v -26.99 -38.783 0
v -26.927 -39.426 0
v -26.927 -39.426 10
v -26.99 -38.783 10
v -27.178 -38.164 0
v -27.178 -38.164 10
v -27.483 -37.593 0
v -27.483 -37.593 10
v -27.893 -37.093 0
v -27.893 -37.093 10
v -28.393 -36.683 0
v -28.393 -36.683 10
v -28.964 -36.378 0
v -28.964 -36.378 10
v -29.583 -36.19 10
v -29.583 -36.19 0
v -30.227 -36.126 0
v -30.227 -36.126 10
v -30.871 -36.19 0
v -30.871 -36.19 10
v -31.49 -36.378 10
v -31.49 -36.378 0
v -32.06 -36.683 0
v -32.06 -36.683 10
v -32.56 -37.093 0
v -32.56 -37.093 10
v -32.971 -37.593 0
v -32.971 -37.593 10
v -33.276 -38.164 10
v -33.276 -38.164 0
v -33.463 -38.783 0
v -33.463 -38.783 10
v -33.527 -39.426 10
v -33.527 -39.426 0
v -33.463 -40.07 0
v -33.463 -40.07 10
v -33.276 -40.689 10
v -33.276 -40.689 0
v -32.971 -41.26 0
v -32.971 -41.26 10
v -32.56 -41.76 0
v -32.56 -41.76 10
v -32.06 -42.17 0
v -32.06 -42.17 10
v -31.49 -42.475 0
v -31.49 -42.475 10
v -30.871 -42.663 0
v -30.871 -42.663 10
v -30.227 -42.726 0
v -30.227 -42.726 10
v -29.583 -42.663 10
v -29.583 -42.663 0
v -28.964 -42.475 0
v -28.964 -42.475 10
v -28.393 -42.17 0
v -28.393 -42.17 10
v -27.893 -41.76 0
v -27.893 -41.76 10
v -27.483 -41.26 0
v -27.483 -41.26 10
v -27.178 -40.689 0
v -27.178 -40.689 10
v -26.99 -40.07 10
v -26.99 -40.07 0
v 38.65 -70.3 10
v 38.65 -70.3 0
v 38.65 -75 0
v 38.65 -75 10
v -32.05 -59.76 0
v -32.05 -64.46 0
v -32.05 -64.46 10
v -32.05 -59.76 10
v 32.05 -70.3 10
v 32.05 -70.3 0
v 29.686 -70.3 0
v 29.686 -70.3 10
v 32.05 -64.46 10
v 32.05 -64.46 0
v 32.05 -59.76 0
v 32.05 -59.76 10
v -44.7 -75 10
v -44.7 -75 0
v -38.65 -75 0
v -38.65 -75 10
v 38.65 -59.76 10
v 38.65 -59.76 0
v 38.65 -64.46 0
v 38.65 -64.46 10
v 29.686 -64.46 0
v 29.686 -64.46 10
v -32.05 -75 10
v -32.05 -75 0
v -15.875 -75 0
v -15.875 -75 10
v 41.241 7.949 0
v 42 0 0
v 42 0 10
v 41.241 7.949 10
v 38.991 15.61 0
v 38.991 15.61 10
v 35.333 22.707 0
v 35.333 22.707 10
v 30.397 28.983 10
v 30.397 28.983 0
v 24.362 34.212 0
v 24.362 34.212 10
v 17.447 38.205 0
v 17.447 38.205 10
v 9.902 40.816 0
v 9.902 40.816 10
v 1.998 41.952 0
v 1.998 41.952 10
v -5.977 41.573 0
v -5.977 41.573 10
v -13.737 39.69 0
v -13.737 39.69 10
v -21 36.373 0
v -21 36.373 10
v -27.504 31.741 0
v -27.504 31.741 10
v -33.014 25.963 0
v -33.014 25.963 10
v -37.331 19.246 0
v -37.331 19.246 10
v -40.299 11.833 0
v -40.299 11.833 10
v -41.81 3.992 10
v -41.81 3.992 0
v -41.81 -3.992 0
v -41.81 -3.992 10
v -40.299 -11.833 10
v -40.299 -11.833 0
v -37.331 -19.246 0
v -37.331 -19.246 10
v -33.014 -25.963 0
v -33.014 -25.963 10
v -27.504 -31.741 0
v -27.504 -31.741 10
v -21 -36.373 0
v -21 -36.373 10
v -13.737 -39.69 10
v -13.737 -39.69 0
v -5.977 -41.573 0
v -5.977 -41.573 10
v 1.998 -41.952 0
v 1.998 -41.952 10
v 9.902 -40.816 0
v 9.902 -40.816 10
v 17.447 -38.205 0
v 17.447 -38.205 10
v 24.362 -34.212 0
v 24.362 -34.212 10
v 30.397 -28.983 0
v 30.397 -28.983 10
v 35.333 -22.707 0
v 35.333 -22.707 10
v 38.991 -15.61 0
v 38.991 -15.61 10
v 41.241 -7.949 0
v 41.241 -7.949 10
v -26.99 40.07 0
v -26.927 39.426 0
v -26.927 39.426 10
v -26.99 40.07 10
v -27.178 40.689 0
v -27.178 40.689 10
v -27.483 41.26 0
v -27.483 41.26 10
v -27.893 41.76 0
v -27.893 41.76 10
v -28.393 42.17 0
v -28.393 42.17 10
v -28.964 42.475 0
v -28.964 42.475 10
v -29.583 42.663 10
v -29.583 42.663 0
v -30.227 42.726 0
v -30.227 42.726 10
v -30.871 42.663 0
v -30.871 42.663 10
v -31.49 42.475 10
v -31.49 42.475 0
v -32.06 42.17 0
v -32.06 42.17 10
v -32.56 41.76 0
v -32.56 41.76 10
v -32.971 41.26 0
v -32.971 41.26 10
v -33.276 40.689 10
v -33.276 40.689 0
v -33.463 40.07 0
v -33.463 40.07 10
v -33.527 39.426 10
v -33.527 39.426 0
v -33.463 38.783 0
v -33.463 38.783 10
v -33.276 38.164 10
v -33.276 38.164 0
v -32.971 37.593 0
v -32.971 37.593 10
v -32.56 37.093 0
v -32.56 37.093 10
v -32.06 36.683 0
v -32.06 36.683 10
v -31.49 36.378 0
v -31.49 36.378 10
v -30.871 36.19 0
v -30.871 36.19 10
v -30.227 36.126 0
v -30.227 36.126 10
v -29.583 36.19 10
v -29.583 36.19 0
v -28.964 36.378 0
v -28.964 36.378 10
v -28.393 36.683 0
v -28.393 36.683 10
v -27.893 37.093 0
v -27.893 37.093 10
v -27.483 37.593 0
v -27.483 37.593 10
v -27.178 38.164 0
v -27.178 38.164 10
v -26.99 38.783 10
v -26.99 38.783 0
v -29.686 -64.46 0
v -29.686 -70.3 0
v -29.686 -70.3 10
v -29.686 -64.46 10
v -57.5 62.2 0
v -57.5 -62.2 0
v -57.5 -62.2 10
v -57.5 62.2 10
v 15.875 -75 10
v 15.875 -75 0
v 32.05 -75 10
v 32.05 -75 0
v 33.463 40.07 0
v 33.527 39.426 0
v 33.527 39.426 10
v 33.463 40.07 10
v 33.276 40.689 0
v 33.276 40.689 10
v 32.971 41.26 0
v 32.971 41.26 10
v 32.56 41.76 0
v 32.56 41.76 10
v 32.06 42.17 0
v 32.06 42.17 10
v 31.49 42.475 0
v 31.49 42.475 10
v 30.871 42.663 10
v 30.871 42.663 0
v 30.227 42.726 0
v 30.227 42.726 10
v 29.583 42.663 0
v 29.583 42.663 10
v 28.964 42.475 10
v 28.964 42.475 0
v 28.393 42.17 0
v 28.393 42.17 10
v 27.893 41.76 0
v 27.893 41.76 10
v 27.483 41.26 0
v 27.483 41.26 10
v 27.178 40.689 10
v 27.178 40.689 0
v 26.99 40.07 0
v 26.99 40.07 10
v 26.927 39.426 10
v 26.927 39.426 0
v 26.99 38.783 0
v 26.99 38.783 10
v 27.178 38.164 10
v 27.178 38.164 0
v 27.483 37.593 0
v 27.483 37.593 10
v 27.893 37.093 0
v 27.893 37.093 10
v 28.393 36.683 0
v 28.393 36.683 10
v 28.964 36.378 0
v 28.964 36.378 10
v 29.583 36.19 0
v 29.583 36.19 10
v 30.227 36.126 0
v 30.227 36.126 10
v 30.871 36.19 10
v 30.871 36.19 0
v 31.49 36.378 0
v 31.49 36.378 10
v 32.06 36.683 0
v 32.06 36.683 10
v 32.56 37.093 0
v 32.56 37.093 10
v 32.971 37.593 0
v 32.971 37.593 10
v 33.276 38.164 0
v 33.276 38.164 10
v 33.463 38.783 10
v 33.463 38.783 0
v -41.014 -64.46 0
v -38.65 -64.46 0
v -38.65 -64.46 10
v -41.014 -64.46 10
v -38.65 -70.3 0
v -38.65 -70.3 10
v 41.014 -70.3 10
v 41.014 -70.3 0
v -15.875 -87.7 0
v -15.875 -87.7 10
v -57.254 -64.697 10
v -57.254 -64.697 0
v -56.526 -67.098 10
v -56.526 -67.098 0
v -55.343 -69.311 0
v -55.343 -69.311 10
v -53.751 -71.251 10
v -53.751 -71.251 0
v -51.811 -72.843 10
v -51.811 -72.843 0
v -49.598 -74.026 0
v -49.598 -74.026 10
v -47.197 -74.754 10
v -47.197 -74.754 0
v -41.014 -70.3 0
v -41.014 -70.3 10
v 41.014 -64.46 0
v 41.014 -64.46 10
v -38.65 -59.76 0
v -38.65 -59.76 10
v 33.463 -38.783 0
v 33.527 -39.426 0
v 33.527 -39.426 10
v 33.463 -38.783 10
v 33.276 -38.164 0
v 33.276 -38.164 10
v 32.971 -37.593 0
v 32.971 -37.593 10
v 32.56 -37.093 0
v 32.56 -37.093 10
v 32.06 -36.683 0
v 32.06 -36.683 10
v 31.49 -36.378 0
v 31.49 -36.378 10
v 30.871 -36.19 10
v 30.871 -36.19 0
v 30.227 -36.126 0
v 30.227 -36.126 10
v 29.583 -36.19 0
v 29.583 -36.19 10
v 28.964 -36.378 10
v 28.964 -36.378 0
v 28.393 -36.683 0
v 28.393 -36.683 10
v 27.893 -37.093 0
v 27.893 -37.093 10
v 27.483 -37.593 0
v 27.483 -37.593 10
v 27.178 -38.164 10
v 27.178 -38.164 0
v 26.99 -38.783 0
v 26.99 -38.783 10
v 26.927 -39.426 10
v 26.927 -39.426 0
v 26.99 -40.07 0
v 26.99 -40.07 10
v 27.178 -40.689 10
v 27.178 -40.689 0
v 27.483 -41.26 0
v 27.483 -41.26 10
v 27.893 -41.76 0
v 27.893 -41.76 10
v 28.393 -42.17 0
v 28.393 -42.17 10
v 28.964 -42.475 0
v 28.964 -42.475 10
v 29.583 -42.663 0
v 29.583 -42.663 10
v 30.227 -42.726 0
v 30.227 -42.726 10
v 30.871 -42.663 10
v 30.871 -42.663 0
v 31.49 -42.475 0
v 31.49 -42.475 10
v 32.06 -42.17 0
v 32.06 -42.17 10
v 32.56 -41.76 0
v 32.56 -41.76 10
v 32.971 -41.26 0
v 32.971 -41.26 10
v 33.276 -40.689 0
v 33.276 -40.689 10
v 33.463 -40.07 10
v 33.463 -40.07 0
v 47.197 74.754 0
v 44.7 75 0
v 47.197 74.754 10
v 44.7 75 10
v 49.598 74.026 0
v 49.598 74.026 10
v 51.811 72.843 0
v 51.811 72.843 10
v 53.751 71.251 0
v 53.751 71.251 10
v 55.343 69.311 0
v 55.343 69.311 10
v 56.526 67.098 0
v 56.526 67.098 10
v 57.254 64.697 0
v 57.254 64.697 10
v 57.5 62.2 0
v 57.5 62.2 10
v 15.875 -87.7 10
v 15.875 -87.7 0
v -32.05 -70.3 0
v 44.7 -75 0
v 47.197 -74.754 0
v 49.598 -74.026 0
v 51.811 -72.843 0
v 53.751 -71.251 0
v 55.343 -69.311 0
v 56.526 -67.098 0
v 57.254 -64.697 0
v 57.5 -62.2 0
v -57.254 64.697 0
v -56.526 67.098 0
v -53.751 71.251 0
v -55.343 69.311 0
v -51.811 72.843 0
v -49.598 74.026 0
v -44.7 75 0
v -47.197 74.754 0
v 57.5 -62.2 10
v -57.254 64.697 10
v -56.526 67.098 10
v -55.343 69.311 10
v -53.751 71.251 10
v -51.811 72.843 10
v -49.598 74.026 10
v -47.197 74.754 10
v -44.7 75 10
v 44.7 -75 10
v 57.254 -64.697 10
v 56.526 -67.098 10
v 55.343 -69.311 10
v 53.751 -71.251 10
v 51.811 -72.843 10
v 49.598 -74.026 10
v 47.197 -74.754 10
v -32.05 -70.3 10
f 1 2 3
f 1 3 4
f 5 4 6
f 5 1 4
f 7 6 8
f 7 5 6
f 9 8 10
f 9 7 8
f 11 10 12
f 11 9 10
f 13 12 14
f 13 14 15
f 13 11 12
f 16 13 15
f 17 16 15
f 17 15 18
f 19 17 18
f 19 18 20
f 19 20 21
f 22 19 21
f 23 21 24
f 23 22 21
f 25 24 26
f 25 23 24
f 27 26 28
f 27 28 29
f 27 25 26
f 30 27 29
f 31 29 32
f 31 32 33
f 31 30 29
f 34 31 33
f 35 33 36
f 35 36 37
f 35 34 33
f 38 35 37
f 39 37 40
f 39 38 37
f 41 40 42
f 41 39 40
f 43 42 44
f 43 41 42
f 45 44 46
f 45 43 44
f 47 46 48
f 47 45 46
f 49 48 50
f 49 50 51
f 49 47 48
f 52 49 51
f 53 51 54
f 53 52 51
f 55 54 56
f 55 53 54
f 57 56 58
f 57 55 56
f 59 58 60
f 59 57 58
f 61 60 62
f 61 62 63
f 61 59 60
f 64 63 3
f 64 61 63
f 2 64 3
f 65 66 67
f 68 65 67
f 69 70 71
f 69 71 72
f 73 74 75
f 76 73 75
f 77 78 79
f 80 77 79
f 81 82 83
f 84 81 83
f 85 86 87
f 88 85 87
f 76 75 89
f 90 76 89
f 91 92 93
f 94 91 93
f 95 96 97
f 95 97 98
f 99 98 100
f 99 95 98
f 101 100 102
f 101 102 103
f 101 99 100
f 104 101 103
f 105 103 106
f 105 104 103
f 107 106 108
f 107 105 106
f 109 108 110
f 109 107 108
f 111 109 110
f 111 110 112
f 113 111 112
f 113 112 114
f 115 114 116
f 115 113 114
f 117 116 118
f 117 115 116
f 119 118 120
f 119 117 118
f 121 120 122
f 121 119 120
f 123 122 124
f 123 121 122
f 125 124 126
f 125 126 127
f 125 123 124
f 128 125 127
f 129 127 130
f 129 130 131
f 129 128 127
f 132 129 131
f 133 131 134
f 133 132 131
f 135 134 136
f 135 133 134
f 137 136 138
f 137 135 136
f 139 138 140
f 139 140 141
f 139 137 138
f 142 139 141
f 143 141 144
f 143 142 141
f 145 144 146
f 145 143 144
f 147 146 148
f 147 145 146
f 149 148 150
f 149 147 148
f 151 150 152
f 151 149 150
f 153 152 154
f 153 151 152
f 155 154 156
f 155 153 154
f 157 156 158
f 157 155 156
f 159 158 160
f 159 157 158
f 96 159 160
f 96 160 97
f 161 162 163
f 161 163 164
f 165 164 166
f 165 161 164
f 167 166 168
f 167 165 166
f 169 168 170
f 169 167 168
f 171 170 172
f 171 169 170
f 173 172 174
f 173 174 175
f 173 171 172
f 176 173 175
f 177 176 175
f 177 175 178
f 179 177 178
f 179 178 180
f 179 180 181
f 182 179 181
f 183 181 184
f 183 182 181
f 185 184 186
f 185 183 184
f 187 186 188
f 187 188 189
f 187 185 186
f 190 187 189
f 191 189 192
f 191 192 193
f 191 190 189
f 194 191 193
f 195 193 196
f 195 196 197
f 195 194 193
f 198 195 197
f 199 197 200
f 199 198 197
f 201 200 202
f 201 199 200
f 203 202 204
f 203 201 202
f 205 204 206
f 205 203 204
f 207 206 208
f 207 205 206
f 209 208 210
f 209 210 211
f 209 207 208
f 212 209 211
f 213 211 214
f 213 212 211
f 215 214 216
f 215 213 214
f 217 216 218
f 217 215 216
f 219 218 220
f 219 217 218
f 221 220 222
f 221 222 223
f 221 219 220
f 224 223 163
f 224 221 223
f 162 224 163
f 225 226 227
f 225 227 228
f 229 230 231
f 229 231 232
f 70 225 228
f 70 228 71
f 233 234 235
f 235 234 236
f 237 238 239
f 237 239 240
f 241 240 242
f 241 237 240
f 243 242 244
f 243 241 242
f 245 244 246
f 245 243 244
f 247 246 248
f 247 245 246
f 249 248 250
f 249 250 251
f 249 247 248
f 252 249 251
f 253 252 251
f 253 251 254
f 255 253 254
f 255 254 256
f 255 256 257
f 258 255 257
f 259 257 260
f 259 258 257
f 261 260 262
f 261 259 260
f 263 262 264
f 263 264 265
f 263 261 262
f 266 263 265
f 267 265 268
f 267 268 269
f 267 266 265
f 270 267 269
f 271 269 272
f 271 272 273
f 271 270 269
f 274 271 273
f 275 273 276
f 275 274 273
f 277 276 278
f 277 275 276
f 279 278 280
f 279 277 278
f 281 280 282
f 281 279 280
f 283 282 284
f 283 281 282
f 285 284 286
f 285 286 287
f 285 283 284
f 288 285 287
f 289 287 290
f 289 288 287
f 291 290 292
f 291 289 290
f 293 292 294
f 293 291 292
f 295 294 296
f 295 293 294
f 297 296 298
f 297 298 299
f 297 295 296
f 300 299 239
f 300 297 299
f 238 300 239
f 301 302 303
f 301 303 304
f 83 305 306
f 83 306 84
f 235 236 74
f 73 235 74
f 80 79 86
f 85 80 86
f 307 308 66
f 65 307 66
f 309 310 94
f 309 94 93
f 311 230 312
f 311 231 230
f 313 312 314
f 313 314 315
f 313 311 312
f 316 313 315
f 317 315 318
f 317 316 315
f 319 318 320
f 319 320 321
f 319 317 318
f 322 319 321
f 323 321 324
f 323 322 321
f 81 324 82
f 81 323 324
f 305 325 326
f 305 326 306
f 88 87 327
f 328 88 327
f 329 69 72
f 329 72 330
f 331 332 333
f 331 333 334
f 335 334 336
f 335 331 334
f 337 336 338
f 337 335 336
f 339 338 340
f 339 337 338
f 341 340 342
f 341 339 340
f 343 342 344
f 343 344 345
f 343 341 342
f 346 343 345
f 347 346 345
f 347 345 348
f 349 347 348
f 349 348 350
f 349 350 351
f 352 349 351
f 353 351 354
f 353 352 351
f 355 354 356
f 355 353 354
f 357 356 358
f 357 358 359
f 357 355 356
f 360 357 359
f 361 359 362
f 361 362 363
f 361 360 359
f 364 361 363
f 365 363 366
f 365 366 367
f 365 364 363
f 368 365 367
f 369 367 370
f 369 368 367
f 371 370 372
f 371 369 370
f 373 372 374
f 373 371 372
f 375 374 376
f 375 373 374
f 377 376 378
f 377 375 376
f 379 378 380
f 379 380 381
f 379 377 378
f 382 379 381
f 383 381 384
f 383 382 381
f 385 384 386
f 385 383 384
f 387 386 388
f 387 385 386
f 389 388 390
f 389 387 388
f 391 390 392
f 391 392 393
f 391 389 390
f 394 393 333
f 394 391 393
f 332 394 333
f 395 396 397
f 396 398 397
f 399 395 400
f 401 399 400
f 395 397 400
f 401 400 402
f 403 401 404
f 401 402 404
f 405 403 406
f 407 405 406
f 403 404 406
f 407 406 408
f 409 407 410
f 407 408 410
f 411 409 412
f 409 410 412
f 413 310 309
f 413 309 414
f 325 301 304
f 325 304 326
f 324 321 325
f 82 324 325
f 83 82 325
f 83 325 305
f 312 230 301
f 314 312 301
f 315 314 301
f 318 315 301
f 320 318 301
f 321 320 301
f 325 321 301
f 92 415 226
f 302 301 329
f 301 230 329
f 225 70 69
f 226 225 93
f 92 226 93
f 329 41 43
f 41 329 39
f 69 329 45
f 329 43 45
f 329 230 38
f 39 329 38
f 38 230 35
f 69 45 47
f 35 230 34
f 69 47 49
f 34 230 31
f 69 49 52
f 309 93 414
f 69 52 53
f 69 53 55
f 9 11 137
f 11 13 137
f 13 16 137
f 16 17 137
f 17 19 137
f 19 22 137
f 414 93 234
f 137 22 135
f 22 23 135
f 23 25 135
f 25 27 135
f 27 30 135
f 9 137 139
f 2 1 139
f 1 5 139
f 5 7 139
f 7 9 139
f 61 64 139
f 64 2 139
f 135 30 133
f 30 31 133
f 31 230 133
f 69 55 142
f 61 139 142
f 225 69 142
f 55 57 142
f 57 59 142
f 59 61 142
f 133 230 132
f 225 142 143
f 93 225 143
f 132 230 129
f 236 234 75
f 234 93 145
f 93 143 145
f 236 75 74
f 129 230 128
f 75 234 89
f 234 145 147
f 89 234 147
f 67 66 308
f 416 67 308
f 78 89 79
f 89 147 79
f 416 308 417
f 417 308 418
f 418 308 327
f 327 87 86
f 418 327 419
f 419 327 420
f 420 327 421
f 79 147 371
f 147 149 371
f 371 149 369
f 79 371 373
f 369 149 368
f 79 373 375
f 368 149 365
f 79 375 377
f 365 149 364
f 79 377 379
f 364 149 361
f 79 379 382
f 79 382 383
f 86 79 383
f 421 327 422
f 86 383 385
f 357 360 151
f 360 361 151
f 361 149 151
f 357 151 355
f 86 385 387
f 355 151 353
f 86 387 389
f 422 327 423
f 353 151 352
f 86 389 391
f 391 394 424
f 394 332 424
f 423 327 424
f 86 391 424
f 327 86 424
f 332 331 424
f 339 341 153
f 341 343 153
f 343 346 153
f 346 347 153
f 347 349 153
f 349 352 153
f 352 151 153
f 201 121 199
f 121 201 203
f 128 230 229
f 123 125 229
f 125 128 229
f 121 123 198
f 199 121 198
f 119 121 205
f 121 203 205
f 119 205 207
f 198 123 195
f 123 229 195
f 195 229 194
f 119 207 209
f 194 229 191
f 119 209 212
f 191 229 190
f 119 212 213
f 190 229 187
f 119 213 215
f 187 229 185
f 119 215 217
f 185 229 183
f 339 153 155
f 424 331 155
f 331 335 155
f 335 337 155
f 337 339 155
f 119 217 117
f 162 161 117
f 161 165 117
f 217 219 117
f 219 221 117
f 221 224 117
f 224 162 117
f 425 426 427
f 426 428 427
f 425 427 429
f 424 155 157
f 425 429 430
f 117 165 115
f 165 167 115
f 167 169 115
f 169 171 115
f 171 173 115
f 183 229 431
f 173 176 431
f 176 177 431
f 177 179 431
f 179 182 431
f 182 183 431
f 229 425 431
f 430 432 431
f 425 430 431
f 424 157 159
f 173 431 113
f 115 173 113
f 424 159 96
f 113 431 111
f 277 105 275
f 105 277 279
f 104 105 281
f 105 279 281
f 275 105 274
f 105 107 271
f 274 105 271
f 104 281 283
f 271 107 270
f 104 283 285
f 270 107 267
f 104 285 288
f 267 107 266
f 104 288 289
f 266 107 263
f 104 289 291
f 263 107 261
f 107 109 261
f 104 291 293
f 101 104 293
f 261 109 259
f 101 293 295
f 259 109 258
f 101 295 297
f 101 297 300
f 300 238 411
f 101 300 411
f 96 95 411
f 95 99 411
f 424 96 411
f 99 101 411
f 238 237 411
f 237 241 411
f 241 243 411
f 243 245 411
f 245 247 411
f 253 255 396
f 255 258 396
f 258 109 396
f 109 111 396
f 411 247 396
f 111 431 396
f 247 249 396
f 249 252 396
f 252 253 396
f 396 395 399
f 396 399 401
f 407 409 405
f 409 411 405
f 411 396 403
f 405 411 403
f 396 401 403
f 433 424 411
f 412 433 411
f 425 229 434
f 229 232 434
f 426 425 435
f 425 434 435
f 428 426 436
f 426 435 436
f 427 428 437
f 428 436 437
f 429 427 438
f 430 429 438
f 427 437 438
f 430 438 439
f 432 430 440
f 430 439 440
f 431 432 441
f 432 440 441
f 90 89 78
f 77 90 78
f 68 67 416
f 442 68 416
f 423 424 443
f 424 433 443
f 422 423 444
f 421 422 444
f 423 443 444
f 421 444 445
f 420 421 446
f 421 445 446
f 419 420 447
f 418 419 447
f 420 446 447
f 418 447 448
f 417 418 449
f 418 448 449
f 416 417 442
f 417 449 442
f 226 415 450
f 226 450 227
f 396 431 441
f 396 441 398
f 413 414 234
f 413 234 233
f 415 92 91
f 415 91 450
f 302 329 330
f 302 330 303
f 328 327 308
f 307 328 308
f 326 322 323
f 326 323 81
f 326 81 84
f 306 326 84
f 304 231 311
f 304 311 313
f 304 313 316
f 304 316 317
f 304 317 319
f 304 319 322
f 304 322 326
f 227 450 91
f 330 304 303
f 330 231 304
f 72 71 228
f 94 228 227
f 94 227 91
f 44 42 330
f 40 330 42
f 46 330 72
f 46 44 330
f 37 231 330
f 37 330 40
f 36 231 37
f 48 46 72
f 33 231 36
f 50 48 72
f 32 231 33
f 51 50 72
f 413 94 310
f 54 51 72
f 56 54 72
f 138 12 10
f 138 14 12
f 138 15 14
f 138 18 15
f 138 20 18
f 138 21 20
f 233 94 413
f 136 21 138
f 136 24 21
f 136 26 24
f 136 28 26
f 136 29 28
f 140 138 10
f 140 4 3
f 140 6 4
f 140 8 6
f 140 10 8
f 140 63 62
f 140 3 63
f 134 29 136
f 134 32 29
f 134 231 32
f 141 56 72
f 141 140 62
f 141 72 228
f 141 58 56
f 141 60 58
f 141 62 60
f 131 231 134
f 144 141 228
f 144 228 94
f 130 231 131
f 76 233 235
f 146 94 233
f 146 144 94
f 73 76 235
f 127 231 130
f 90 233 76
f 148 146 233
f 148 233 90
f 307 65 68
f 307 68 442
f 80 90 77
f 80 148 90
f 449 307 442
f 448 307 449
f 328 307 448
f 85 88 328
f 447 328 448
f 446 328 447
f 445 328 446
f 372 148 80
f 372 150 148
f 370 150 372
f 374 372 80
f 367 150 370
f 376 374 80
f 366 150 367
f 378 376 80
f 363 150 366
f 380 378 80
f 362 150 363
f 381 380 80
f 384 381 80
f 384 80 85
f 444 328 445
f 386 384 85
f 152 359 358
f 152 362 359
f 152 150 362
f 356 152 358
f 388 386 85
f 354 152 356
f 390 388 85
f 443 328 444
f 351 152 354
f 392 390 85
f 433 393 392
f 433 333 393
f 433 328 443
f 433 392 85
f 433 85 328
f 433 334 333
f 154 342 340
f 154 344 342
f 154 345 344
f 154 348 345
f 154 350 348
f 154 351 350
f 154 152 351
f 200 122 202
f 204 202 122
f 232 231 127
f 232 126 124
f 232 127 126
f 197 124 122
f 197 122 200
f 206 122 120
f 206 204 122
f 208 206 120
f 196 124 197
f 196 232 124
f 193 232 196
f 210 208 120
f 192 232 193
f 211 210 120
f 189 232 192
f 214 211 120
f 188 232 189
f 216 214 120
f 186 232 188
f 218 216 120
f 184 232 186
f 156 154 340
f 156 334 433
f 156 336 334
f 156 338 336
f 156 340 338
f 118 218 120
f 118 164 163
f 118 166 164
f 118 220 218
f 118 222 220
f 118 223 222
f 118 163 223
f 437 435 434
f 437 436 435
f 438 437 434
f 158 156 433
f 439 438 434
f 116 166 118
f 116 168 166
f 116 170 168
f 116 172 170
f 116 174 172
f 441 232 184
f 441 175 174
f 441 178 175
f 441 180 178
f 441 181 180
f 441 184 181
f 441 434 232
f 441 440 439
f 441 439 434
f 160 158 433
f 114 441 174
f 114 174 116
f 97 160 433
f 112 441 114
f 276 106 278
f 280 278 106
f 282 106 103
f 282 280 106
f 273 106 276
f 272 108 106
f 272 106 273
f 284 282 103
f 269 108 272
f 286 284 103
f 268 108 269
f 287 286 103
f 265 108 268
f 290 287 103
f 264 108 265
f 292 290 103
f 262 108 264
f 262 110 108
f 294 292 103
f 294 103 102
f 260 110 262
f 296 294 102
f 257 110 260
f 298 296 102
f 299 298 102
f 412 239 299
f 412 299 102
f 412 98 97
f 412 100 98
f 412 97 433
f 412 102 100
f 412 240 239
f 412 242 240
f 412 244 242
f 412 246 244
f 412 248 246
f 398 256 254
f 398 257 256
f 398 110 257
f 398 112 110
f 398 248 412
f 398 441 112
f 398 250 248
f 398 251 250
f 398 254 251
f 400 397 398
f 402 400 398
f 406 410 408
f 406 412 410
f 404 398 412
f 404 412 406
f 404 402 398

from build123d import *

# Parameters (mm, degrees)
SKETCH1_W           = 115
SKETCH1_H           = 150
SKETCH1_R           = 42
SKETCH1_R_2         = 3.3
BOSS_EXTRUDE1_DEPTH = 10
CUT_EXTRUDE1_DEPTH  = 96.032889044
BOSS_EXTRUDE2_DEPTH = 12.7
FILLET1_R           = 12.8


with BuildPart() as part:
    # Sketch1 → Boss-Extrude1 (new body)
    with BuildSketch(Plane.XY):
        Rectangle(SKETCH1_W, SKETCH1_H)
        Circle(SKETCH1_R, mode=Mode.SUBTRACT)
        with Locations((-30.226879089, 39.426364029)):
            Circle(SKETCH1_R_2, mode=Mode.SUBTRACT)
        with Locations((30.226879089, 39.426364029)):
            Circle(SKETCH1_R_2, mode=Mode.SUBTRACT)
        with Locations((30.226879089, -39.426364029)):
            Circle(SKETCH1_R_2, mode=Mode.SUBTRACT)
        with Locations((-30.226879089, -39.426364029)):
            Circle(SKETCH1_R_2, mode=Mode.SUBTRACT)
    extrude(amount=BOSS_EXTRUDE1_DEPTH)

    # Sketch2 → Cut-Extrude1 (cut, through all)
    with BuildSketch(Plane(origin=(0, 0, 0), x_dir=(-1, 0, 0), z_dir=(0, 0, -1))):
        Polygon((-38.65, -75), (-32.05, -75), (-32.05, -70.3), (-29.686, -70.3), (-29.686, -64.46), (-32.05, -64.46), (-32.05, -59.76), (-38.65, -59.76), (-38.65, -64.46), (-41.014, -64.46), (-41.014, -70.3), (-38.65, -70.3), align=None)
        Polygon((32.05, -75), (32.05, -70.3), (29.686, -70.3), (29.686, -64.46), (32.05, -64.46), (32.05, -59.76), (38.65, -59.76), (38.65, -64.46), (41.014, -64.46), (41.014, -70.3), (38.65, -70.3), (38.65, -75), align=None)
    extrude(amount=-CUT_EXTRUDE1_DEPTH, mode=Mode.SUBTRACT)

    # Sketch4 → Boss-Extrude2 (add)
    with BuildSketch(Plane.XZ.offset(75)):
        Polygon((0, 0), (15.875, 0), (15.875, 10), (-15.875, 10), (-15.875, 0), align=None)
    extrude(amount=BOSS_EXTRUDE2_DEPTH)

    # Fillet1
    fillet1_edges = [part.edges().sort_by_distance(p)[0] for p in [
        (57.5, -75, 5),
        (-57.5, -75, 5),
        (-57.5, 75, 5),
        (57.5, 75, 5),
    ]]
    fillet(fillet1_edges, radius=FILLET1_R)


solid = part.part
